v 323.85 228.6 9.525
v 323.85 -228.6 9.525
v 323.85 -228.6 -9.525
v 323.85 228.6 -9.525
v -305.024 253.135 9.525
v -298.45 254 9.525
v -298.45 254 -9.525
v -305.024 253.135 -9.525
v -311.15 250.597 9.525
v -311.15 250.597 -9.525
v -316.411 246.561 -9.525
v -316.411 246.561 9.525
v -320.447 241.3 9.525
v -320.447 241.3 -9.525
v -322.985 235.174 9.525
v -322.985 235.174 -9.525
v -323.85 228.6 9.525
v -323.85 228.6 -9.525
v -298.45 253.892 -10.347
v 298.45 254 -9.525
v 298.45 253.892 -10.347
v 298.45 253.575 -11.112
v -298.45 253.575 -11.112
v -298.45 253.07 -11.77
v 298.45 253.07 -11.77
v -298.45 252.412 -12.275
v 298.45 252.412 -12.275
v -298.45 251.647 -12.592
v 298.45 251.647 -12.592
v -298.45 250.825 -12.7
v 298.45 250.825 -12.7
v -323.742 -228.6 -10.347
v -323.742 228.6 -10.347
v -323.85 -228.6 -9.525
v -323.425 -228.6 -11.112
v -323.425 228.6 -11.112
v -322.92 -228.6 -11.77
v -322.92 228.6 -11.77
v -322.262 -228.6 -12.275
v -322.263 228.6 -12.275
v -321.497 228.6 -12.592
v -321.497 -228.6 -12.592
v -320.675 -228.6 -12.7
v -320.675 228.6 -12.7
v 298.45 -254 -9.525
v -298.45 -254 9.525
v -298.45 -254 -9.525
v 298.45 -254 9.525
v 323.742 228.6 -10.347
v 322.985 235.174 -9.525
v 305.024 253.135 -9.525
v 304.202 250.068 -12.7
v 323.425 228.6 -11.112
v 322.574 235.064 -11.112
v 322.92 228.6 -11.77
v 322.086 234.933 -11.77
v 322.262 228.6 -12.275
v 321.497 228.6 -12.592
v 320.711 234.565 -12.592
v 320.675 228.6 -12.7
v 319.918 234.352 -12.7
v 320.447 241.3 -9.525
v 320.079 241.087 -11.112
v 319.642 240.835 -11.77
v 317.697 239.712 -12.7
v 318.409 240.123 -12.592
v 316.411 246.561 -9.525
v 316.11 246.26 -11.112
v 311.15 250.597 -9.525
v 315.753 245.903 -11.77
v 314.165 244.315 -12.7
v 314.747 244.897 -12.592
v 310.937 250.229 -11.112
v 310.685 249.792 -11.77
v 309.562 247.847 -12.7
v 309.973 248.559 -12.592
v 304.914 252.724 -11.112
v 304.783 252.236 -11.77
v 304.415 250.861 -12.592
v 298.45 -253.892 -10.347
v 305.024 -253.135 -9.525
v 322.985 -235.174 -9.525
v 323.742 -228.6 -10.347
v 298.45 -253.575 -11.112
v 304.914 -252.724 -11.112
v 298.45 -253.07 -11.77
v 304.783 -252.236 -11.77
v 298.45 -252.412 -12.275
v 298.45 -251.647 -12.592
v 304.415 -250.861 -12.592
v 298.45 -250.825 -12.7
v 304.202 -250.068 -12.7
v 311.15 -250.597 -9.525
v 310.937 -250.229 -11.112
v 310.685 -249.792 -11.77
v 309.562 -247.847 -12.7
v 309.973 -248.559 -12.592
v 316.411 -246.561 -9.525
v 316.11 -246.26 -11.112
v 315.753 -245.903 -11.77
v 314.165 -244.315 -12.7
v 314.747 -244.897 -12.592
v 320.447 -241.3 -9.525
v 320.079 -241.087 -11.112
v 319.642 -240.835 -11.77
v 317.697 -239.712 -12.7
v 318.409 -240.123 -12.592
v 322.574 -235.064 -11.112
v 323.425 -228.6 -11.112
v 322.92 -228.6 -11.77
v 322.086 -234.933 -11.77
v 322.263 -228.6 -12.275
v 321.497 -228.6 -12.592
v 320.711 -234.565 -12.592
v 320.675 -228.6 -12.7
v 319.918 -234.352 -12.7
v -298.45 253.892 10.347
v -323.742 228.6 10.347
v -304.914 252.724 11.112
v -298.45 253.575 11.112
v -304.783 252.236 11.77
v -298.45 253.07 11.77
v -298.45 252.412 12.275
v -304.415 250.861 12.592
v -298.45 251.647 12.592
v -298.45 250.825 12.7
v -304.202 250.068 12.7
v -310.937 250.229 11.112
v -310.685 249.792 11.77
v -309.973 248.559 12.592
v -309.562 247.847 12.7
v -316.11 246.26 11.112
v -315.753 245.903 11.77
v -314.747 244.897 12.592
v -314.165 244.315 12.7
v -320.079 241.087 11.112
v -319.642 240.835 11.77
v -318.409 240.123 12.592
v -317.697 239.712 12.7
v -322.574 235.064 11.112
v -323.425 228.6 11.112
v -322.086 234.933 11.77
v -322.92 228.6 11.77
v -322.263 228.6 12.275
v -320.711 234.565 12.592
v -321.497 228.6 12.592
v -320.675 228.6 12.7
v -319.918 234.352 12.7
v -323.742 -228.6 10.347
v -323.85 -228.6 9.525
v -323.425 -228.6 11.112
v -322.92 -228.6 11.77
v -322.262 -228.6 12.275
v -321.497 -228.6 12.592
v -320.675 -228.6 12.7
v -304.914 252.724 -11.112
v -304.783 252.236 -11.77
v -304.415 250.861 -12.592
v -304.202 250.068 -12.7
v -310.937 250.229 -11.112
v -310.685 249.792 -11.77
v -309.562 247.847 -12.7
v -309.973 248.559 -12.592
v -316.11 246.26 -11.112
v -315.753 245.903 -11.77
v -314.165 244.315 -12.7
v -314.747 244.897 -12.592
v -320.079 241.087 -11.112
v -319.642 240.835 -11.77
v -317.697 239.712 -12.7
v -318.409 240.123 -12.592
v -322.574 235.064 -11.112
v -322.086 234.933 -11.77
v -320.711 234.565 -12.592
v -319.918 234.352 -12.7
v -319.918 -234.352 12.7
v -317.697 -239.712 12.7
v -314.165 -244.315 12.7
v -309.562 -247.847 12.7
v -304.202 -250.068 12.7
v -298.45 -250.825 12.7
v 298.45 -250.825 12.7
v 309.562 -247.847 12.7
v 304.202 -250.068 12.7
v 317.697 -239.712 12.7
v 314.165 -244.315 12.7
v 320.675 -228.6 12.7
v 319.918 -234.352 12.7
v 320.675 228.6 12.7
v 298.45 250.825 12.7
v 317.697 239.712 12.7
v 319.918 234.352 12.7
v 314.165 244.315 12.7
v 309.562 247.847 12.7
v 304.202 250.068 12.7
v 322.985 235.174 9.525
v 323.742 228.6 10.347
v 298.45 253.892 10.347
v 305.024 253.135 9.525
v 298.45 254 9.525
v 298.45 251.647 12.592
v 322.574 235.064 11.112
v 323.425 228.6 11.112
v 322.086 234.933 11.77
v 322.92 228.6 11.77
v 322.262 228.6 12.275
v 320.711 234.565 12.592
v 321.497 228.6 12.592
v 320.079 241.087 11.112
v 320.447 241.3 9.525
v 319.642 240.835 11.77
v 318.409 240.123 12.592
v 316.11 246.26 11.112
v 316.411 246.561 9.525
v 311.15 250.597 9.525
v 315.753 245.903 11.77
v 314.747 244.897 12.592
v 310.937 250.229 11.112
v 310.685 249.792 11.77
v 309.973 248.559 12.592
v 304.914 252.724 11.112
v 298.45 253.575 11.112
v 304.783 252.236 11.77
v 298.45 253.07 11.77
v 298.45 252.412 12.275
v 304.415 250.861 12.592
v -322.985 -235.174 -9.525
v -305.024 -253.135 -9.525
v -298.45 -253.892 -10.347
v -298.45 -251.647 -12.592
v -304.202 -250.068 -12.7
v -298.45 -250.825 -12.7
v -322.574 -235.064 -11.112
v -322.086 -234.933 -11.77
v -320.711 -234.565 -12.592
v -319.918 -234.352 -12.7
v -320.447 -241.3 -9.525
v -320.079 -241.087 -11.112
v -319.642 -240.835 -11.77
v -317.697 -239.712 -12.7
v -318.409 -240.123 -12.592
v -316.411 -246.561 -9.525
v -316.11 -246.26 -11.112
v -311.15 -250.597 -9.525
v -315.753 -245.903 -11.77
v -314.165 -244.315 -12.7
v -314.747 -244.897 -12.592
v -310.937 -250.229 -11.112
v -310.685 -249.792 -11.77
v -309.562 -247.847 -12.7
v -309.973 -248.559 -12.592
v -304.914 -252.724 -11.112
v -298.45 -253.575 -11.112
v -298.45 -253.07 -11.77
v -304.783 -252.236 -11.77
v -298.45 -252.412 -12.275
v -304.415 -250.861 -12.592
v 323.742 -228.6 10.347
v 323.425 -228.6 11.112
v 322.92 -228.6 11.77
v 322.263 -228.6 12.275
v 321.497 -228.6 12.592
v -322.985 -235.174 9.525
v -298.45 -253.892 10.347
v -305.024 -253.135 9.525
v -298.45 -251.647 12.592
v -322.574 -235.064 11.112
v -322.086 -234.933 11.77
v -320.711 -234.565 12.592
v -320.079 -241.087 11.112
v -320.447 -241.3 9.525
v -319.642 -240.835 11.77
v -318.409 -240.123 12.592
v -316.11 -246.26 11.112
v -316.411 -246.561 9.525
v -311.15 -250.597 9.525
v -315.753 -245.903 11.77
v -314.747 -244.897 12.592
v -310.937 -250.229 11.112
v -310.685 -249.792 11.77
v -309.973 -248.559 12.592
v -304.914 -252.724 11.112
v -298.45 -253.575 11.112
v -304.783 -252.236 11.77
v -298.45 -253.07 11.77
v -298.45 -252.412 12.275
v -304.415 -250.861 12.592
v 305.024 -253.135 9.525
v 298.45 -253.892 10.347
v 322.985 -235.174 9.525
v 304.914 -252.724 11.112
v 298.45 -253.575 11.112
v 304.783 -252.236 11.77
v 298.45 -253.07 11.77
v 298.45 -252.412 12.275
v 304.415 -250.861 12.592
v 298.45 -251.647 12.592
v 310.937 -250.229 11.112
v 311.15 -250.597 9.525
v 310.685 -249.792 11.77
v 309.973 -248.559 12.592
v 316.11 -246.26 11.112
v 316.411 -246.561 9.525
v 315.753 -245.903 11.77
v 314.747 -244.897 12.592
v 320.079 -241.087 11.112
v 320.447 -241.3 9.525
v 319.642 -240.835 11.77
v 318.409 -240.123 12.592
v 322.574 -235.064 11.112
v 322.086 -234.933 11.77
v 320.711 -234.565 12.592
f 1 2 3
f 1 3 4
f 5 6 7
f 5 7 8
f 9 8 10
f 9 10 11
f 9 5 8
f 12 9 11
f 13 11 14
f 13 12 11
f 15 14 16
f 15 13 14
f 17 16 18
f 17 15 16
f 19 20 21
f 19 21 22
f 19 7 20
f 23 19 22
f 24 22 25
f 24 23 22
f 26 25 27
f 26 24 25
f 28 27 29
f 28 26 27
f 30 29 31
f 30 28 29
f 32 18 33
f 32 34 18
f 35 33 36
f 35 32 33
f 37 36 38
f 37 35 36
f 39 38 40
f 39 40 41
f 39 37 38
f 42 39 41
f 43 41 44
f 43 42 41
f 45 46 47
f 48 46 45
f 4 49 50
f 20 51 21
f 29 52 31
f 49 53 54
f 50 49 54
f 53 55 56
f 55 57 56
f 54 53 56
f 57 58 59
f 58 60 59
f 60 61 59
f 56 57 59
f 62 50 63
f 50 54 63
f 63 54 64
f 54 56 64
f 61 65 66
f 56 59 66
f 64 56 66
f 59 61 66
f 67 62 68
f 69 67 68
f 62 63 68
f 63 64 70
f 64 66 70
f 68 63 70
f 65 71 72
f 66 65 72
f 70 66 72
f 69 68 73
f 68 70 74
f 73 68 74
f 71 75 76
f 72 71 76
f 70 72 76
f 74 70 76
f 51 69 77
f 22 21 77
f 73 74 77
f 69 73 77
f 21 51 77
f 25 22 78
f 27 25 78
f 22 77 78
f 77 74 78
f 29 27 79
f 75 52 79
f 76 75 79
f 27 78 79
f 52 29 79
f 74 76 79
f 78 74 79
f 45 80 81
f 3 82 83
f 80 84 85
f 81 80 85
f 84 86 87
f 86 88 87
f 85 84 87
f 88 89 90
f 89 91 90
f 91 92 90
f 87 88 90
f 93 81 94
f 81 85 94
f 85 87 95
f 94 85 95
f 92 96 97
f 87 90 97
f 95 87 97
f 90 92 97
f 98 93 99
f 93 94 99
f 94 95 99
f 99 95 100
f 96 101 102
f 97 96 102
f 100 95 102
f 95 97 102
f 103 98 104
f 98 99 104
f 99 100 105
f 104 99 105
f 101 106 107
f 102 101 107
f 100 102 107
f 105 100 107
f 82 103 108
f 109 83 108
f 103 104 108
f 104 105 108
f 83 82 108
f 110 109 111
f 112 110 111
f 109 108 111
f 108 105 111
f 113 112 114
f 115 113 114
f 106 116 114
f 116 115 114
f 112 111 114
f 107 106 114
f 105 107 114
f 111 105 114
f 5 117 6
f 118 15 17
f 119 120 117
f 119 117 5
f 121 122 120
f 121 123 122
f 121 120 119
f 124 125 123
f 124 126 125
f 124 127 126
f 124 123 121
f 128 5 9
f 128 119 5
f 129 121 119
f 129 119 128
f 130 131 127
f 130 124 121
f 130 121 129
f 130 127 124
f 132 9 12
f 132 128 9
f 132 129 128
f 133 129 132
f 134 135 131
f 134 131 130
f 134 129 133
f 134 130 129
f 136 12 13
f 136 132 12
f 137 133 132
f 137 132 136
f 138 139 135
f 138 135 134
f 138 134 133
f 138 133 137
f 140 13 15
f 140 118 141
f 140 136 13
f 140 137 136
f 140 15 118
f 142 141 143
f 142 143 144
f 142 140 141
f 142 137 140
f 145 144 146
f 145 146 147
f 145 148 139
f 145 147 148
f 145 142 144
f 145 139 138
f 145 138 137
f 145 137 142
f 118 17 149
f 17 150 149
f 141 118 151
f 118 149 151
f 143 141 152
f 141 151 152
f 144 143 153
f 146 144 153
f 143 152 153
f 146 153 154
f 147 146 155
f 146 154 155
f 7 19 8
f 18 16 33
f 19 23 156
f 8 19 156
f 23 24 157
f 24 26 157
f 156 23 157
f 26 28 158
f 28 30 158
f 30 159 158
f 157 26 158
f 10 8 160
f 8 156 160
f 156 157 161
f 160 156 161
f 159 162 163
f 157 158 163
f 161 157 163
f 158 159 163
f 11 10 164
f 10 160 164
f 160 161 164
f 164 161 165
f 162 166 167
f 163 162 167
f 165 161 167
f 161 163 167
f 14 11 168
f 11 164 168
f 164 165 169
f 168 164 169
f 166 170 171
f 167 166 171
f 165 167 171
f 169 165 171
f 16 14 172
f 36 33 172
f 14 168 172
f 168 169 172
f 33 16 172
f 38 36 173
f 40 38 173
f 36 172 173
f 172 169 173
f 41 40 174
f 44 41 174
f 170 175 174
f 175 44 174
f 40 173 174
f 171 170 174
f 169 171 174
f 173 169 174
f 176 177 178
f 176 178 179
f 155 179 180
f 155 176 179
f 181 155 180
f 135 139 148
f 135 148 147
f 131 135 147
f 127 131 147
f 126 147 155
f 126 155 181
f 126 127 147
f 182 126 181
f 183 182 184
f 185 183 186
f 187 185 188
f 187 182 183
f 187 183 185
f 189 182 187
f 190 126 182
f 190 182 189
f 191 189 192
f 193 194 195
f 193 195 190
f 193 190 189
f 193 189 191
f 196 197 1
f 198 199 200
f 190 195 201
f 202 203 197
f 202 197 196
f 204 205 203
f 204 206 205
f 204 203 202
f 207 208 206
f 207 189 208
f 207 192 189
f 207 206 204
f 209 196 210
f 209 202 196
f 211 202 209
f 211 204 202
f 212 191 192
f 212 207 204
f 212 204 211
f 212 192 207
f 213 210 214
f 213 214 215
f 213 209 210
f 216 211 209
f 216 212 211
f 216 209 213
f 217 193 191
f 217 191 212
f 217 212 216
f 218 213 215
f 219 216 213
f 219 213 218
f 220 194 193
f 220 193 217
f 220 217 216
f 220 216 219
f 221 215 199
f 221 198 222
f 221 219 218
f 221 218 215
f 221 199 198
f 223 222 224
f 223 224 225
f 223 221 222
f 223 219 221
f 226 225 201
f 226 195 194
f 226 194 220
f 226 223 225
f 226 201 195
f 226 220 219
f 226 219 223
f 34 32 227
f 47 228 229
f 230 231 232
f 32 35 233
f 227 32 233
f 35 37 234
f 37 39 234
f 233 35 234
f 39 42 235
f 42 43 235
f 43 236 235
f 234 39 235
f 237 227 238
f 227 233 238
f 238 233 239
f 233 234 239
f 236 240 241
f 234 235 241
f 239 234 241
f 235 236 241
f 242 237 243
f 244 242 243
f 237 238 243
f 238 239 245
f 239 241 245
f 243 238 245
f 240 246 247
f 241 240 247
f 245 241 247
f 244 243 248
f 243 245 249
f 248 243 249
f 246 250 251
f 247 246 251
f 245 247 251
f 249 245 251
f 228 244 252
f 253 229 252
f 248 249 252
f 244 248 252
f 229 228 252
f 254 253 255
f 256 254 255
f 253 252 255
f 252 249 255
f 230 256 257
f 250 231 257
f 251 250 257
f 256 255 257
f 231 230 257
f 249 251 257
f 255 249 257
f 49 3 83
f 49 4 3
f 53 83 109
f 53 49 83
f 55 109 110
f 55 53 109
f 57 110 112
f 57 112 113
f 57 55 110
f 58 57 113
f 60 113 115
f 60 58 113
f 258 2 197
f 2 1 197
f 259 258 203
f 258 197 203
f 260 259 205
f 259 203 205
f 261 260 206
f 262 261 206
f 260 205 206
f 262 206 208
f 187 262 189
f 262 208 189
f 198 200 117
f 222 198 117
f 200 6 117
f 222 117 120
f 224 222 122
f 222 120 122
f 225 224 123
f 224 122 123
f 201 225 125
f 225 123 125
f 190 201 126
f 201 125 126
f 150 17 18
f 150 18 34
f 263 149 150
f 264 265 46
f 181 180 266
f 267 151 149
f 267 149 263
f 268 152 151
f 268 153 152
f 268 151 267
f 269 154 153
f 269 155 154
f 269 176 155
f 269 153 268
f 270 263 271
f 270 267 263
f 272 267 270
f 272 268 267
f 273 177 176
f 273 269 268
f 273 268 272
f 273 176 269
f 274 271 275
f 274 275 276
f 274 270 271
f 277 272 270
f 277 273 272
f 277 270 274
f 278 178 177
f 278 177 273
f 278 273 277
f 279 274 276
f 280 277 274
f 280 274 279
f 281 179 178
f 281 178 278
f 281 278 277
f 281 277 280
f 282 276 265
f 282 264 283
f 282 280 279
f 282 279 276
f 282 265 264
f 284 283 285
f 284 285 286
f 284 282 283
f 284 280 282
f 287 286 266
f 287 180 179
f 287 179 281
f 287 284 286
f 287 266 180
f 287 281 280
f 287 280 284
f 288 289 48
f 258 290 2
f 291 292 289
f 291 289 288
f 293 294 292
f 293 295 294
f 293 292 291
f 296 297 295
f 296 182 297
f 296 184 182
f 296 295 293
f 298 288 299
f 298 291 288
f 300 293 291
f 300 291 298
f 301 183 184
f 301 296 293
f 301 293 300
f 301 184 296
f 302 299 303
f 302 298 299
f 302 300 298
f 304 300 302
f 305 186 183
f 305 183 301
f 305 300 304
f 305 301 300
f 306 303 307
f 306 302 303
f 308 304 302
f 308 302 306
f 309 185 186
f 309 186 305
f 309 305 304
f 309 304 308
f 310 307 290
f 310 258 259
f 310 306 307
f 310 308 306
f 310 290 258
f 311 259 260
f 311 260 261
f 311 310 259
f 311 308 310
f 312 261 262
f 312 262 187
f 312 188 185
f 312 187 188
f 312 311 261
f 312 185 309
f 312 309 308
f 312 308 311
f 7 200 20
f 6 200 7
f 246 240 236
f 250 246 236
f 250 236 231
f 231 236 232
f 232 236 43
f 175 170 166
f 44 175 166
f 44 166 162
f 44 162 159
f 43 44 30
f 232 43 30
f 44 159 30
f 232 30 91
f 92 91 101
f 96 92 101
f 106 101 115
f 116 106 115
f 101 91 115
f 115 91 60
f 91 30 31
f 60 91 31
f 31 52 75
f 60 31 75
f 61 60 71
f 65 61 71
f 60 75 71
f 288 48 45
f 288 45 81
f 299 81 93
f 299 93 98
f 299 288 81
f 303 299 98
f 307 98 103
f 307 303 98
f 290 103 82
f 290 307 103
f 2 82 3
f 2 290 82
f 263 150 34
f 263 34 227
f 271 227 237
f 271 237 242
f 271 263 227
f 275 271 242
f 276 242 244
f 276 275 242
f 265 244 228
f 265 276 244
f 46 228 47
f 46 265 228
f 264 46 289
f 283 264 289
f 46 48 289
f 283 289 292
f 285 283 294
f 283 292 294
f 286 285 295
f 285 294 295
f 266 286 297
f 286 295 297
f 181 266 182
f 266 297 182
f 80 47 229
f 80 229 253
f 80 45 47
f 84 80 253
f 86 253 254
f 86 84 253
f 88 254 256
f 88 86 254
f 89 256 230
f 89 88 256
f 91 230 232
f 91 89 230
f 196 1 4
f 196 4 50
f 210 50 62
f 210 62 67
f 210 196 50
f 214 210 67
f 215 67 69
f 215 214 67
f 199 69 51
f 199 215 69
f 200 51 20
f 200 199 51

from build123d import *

# Parameters (mm, degrees)
F1_DEPTH = 12.7
F2_R     = 3.175


with BuildPart() as f1:
    # F0 (on Top) → F1 (new body, symmetric)
    with BuildSketch(Plane.XY):
        with BuildLine():
            ThreePointArc((323.85, 228.6), (316.410512, 246.560512), (298.45, 254))
            Line((298.45, 254), (-298.45, 254))
            ThreePointArc((-298.45, 254), (-316.410512, 246.560512), (-323.85, 228.6))
            Line((-323.85, 228.6), (-323.85, -228.6))
            ThreePointArc((-323.85, -228.6), (-316.410512, -246.560512), (-298.45, -254))
            Line((-298.45, -254), (298.45, -254))
            ThreePointArc((298.45, -254), (316.410512, -246.560512), (323.85, -228.6))
            Line((323.85, -228.6), (323.85, 228.6))
        make_face()
    extrude(amount=F1_DEPTH, both=True)

    # F2
    f2_edges = [f1.edges().sort_by_distance(p)[0] for p in [
        (0, -254, 12.7),
        (0, 254, -12.7),
    ]]
    fillet(f2_edges, radius=F2_R)


solid = f1.part
